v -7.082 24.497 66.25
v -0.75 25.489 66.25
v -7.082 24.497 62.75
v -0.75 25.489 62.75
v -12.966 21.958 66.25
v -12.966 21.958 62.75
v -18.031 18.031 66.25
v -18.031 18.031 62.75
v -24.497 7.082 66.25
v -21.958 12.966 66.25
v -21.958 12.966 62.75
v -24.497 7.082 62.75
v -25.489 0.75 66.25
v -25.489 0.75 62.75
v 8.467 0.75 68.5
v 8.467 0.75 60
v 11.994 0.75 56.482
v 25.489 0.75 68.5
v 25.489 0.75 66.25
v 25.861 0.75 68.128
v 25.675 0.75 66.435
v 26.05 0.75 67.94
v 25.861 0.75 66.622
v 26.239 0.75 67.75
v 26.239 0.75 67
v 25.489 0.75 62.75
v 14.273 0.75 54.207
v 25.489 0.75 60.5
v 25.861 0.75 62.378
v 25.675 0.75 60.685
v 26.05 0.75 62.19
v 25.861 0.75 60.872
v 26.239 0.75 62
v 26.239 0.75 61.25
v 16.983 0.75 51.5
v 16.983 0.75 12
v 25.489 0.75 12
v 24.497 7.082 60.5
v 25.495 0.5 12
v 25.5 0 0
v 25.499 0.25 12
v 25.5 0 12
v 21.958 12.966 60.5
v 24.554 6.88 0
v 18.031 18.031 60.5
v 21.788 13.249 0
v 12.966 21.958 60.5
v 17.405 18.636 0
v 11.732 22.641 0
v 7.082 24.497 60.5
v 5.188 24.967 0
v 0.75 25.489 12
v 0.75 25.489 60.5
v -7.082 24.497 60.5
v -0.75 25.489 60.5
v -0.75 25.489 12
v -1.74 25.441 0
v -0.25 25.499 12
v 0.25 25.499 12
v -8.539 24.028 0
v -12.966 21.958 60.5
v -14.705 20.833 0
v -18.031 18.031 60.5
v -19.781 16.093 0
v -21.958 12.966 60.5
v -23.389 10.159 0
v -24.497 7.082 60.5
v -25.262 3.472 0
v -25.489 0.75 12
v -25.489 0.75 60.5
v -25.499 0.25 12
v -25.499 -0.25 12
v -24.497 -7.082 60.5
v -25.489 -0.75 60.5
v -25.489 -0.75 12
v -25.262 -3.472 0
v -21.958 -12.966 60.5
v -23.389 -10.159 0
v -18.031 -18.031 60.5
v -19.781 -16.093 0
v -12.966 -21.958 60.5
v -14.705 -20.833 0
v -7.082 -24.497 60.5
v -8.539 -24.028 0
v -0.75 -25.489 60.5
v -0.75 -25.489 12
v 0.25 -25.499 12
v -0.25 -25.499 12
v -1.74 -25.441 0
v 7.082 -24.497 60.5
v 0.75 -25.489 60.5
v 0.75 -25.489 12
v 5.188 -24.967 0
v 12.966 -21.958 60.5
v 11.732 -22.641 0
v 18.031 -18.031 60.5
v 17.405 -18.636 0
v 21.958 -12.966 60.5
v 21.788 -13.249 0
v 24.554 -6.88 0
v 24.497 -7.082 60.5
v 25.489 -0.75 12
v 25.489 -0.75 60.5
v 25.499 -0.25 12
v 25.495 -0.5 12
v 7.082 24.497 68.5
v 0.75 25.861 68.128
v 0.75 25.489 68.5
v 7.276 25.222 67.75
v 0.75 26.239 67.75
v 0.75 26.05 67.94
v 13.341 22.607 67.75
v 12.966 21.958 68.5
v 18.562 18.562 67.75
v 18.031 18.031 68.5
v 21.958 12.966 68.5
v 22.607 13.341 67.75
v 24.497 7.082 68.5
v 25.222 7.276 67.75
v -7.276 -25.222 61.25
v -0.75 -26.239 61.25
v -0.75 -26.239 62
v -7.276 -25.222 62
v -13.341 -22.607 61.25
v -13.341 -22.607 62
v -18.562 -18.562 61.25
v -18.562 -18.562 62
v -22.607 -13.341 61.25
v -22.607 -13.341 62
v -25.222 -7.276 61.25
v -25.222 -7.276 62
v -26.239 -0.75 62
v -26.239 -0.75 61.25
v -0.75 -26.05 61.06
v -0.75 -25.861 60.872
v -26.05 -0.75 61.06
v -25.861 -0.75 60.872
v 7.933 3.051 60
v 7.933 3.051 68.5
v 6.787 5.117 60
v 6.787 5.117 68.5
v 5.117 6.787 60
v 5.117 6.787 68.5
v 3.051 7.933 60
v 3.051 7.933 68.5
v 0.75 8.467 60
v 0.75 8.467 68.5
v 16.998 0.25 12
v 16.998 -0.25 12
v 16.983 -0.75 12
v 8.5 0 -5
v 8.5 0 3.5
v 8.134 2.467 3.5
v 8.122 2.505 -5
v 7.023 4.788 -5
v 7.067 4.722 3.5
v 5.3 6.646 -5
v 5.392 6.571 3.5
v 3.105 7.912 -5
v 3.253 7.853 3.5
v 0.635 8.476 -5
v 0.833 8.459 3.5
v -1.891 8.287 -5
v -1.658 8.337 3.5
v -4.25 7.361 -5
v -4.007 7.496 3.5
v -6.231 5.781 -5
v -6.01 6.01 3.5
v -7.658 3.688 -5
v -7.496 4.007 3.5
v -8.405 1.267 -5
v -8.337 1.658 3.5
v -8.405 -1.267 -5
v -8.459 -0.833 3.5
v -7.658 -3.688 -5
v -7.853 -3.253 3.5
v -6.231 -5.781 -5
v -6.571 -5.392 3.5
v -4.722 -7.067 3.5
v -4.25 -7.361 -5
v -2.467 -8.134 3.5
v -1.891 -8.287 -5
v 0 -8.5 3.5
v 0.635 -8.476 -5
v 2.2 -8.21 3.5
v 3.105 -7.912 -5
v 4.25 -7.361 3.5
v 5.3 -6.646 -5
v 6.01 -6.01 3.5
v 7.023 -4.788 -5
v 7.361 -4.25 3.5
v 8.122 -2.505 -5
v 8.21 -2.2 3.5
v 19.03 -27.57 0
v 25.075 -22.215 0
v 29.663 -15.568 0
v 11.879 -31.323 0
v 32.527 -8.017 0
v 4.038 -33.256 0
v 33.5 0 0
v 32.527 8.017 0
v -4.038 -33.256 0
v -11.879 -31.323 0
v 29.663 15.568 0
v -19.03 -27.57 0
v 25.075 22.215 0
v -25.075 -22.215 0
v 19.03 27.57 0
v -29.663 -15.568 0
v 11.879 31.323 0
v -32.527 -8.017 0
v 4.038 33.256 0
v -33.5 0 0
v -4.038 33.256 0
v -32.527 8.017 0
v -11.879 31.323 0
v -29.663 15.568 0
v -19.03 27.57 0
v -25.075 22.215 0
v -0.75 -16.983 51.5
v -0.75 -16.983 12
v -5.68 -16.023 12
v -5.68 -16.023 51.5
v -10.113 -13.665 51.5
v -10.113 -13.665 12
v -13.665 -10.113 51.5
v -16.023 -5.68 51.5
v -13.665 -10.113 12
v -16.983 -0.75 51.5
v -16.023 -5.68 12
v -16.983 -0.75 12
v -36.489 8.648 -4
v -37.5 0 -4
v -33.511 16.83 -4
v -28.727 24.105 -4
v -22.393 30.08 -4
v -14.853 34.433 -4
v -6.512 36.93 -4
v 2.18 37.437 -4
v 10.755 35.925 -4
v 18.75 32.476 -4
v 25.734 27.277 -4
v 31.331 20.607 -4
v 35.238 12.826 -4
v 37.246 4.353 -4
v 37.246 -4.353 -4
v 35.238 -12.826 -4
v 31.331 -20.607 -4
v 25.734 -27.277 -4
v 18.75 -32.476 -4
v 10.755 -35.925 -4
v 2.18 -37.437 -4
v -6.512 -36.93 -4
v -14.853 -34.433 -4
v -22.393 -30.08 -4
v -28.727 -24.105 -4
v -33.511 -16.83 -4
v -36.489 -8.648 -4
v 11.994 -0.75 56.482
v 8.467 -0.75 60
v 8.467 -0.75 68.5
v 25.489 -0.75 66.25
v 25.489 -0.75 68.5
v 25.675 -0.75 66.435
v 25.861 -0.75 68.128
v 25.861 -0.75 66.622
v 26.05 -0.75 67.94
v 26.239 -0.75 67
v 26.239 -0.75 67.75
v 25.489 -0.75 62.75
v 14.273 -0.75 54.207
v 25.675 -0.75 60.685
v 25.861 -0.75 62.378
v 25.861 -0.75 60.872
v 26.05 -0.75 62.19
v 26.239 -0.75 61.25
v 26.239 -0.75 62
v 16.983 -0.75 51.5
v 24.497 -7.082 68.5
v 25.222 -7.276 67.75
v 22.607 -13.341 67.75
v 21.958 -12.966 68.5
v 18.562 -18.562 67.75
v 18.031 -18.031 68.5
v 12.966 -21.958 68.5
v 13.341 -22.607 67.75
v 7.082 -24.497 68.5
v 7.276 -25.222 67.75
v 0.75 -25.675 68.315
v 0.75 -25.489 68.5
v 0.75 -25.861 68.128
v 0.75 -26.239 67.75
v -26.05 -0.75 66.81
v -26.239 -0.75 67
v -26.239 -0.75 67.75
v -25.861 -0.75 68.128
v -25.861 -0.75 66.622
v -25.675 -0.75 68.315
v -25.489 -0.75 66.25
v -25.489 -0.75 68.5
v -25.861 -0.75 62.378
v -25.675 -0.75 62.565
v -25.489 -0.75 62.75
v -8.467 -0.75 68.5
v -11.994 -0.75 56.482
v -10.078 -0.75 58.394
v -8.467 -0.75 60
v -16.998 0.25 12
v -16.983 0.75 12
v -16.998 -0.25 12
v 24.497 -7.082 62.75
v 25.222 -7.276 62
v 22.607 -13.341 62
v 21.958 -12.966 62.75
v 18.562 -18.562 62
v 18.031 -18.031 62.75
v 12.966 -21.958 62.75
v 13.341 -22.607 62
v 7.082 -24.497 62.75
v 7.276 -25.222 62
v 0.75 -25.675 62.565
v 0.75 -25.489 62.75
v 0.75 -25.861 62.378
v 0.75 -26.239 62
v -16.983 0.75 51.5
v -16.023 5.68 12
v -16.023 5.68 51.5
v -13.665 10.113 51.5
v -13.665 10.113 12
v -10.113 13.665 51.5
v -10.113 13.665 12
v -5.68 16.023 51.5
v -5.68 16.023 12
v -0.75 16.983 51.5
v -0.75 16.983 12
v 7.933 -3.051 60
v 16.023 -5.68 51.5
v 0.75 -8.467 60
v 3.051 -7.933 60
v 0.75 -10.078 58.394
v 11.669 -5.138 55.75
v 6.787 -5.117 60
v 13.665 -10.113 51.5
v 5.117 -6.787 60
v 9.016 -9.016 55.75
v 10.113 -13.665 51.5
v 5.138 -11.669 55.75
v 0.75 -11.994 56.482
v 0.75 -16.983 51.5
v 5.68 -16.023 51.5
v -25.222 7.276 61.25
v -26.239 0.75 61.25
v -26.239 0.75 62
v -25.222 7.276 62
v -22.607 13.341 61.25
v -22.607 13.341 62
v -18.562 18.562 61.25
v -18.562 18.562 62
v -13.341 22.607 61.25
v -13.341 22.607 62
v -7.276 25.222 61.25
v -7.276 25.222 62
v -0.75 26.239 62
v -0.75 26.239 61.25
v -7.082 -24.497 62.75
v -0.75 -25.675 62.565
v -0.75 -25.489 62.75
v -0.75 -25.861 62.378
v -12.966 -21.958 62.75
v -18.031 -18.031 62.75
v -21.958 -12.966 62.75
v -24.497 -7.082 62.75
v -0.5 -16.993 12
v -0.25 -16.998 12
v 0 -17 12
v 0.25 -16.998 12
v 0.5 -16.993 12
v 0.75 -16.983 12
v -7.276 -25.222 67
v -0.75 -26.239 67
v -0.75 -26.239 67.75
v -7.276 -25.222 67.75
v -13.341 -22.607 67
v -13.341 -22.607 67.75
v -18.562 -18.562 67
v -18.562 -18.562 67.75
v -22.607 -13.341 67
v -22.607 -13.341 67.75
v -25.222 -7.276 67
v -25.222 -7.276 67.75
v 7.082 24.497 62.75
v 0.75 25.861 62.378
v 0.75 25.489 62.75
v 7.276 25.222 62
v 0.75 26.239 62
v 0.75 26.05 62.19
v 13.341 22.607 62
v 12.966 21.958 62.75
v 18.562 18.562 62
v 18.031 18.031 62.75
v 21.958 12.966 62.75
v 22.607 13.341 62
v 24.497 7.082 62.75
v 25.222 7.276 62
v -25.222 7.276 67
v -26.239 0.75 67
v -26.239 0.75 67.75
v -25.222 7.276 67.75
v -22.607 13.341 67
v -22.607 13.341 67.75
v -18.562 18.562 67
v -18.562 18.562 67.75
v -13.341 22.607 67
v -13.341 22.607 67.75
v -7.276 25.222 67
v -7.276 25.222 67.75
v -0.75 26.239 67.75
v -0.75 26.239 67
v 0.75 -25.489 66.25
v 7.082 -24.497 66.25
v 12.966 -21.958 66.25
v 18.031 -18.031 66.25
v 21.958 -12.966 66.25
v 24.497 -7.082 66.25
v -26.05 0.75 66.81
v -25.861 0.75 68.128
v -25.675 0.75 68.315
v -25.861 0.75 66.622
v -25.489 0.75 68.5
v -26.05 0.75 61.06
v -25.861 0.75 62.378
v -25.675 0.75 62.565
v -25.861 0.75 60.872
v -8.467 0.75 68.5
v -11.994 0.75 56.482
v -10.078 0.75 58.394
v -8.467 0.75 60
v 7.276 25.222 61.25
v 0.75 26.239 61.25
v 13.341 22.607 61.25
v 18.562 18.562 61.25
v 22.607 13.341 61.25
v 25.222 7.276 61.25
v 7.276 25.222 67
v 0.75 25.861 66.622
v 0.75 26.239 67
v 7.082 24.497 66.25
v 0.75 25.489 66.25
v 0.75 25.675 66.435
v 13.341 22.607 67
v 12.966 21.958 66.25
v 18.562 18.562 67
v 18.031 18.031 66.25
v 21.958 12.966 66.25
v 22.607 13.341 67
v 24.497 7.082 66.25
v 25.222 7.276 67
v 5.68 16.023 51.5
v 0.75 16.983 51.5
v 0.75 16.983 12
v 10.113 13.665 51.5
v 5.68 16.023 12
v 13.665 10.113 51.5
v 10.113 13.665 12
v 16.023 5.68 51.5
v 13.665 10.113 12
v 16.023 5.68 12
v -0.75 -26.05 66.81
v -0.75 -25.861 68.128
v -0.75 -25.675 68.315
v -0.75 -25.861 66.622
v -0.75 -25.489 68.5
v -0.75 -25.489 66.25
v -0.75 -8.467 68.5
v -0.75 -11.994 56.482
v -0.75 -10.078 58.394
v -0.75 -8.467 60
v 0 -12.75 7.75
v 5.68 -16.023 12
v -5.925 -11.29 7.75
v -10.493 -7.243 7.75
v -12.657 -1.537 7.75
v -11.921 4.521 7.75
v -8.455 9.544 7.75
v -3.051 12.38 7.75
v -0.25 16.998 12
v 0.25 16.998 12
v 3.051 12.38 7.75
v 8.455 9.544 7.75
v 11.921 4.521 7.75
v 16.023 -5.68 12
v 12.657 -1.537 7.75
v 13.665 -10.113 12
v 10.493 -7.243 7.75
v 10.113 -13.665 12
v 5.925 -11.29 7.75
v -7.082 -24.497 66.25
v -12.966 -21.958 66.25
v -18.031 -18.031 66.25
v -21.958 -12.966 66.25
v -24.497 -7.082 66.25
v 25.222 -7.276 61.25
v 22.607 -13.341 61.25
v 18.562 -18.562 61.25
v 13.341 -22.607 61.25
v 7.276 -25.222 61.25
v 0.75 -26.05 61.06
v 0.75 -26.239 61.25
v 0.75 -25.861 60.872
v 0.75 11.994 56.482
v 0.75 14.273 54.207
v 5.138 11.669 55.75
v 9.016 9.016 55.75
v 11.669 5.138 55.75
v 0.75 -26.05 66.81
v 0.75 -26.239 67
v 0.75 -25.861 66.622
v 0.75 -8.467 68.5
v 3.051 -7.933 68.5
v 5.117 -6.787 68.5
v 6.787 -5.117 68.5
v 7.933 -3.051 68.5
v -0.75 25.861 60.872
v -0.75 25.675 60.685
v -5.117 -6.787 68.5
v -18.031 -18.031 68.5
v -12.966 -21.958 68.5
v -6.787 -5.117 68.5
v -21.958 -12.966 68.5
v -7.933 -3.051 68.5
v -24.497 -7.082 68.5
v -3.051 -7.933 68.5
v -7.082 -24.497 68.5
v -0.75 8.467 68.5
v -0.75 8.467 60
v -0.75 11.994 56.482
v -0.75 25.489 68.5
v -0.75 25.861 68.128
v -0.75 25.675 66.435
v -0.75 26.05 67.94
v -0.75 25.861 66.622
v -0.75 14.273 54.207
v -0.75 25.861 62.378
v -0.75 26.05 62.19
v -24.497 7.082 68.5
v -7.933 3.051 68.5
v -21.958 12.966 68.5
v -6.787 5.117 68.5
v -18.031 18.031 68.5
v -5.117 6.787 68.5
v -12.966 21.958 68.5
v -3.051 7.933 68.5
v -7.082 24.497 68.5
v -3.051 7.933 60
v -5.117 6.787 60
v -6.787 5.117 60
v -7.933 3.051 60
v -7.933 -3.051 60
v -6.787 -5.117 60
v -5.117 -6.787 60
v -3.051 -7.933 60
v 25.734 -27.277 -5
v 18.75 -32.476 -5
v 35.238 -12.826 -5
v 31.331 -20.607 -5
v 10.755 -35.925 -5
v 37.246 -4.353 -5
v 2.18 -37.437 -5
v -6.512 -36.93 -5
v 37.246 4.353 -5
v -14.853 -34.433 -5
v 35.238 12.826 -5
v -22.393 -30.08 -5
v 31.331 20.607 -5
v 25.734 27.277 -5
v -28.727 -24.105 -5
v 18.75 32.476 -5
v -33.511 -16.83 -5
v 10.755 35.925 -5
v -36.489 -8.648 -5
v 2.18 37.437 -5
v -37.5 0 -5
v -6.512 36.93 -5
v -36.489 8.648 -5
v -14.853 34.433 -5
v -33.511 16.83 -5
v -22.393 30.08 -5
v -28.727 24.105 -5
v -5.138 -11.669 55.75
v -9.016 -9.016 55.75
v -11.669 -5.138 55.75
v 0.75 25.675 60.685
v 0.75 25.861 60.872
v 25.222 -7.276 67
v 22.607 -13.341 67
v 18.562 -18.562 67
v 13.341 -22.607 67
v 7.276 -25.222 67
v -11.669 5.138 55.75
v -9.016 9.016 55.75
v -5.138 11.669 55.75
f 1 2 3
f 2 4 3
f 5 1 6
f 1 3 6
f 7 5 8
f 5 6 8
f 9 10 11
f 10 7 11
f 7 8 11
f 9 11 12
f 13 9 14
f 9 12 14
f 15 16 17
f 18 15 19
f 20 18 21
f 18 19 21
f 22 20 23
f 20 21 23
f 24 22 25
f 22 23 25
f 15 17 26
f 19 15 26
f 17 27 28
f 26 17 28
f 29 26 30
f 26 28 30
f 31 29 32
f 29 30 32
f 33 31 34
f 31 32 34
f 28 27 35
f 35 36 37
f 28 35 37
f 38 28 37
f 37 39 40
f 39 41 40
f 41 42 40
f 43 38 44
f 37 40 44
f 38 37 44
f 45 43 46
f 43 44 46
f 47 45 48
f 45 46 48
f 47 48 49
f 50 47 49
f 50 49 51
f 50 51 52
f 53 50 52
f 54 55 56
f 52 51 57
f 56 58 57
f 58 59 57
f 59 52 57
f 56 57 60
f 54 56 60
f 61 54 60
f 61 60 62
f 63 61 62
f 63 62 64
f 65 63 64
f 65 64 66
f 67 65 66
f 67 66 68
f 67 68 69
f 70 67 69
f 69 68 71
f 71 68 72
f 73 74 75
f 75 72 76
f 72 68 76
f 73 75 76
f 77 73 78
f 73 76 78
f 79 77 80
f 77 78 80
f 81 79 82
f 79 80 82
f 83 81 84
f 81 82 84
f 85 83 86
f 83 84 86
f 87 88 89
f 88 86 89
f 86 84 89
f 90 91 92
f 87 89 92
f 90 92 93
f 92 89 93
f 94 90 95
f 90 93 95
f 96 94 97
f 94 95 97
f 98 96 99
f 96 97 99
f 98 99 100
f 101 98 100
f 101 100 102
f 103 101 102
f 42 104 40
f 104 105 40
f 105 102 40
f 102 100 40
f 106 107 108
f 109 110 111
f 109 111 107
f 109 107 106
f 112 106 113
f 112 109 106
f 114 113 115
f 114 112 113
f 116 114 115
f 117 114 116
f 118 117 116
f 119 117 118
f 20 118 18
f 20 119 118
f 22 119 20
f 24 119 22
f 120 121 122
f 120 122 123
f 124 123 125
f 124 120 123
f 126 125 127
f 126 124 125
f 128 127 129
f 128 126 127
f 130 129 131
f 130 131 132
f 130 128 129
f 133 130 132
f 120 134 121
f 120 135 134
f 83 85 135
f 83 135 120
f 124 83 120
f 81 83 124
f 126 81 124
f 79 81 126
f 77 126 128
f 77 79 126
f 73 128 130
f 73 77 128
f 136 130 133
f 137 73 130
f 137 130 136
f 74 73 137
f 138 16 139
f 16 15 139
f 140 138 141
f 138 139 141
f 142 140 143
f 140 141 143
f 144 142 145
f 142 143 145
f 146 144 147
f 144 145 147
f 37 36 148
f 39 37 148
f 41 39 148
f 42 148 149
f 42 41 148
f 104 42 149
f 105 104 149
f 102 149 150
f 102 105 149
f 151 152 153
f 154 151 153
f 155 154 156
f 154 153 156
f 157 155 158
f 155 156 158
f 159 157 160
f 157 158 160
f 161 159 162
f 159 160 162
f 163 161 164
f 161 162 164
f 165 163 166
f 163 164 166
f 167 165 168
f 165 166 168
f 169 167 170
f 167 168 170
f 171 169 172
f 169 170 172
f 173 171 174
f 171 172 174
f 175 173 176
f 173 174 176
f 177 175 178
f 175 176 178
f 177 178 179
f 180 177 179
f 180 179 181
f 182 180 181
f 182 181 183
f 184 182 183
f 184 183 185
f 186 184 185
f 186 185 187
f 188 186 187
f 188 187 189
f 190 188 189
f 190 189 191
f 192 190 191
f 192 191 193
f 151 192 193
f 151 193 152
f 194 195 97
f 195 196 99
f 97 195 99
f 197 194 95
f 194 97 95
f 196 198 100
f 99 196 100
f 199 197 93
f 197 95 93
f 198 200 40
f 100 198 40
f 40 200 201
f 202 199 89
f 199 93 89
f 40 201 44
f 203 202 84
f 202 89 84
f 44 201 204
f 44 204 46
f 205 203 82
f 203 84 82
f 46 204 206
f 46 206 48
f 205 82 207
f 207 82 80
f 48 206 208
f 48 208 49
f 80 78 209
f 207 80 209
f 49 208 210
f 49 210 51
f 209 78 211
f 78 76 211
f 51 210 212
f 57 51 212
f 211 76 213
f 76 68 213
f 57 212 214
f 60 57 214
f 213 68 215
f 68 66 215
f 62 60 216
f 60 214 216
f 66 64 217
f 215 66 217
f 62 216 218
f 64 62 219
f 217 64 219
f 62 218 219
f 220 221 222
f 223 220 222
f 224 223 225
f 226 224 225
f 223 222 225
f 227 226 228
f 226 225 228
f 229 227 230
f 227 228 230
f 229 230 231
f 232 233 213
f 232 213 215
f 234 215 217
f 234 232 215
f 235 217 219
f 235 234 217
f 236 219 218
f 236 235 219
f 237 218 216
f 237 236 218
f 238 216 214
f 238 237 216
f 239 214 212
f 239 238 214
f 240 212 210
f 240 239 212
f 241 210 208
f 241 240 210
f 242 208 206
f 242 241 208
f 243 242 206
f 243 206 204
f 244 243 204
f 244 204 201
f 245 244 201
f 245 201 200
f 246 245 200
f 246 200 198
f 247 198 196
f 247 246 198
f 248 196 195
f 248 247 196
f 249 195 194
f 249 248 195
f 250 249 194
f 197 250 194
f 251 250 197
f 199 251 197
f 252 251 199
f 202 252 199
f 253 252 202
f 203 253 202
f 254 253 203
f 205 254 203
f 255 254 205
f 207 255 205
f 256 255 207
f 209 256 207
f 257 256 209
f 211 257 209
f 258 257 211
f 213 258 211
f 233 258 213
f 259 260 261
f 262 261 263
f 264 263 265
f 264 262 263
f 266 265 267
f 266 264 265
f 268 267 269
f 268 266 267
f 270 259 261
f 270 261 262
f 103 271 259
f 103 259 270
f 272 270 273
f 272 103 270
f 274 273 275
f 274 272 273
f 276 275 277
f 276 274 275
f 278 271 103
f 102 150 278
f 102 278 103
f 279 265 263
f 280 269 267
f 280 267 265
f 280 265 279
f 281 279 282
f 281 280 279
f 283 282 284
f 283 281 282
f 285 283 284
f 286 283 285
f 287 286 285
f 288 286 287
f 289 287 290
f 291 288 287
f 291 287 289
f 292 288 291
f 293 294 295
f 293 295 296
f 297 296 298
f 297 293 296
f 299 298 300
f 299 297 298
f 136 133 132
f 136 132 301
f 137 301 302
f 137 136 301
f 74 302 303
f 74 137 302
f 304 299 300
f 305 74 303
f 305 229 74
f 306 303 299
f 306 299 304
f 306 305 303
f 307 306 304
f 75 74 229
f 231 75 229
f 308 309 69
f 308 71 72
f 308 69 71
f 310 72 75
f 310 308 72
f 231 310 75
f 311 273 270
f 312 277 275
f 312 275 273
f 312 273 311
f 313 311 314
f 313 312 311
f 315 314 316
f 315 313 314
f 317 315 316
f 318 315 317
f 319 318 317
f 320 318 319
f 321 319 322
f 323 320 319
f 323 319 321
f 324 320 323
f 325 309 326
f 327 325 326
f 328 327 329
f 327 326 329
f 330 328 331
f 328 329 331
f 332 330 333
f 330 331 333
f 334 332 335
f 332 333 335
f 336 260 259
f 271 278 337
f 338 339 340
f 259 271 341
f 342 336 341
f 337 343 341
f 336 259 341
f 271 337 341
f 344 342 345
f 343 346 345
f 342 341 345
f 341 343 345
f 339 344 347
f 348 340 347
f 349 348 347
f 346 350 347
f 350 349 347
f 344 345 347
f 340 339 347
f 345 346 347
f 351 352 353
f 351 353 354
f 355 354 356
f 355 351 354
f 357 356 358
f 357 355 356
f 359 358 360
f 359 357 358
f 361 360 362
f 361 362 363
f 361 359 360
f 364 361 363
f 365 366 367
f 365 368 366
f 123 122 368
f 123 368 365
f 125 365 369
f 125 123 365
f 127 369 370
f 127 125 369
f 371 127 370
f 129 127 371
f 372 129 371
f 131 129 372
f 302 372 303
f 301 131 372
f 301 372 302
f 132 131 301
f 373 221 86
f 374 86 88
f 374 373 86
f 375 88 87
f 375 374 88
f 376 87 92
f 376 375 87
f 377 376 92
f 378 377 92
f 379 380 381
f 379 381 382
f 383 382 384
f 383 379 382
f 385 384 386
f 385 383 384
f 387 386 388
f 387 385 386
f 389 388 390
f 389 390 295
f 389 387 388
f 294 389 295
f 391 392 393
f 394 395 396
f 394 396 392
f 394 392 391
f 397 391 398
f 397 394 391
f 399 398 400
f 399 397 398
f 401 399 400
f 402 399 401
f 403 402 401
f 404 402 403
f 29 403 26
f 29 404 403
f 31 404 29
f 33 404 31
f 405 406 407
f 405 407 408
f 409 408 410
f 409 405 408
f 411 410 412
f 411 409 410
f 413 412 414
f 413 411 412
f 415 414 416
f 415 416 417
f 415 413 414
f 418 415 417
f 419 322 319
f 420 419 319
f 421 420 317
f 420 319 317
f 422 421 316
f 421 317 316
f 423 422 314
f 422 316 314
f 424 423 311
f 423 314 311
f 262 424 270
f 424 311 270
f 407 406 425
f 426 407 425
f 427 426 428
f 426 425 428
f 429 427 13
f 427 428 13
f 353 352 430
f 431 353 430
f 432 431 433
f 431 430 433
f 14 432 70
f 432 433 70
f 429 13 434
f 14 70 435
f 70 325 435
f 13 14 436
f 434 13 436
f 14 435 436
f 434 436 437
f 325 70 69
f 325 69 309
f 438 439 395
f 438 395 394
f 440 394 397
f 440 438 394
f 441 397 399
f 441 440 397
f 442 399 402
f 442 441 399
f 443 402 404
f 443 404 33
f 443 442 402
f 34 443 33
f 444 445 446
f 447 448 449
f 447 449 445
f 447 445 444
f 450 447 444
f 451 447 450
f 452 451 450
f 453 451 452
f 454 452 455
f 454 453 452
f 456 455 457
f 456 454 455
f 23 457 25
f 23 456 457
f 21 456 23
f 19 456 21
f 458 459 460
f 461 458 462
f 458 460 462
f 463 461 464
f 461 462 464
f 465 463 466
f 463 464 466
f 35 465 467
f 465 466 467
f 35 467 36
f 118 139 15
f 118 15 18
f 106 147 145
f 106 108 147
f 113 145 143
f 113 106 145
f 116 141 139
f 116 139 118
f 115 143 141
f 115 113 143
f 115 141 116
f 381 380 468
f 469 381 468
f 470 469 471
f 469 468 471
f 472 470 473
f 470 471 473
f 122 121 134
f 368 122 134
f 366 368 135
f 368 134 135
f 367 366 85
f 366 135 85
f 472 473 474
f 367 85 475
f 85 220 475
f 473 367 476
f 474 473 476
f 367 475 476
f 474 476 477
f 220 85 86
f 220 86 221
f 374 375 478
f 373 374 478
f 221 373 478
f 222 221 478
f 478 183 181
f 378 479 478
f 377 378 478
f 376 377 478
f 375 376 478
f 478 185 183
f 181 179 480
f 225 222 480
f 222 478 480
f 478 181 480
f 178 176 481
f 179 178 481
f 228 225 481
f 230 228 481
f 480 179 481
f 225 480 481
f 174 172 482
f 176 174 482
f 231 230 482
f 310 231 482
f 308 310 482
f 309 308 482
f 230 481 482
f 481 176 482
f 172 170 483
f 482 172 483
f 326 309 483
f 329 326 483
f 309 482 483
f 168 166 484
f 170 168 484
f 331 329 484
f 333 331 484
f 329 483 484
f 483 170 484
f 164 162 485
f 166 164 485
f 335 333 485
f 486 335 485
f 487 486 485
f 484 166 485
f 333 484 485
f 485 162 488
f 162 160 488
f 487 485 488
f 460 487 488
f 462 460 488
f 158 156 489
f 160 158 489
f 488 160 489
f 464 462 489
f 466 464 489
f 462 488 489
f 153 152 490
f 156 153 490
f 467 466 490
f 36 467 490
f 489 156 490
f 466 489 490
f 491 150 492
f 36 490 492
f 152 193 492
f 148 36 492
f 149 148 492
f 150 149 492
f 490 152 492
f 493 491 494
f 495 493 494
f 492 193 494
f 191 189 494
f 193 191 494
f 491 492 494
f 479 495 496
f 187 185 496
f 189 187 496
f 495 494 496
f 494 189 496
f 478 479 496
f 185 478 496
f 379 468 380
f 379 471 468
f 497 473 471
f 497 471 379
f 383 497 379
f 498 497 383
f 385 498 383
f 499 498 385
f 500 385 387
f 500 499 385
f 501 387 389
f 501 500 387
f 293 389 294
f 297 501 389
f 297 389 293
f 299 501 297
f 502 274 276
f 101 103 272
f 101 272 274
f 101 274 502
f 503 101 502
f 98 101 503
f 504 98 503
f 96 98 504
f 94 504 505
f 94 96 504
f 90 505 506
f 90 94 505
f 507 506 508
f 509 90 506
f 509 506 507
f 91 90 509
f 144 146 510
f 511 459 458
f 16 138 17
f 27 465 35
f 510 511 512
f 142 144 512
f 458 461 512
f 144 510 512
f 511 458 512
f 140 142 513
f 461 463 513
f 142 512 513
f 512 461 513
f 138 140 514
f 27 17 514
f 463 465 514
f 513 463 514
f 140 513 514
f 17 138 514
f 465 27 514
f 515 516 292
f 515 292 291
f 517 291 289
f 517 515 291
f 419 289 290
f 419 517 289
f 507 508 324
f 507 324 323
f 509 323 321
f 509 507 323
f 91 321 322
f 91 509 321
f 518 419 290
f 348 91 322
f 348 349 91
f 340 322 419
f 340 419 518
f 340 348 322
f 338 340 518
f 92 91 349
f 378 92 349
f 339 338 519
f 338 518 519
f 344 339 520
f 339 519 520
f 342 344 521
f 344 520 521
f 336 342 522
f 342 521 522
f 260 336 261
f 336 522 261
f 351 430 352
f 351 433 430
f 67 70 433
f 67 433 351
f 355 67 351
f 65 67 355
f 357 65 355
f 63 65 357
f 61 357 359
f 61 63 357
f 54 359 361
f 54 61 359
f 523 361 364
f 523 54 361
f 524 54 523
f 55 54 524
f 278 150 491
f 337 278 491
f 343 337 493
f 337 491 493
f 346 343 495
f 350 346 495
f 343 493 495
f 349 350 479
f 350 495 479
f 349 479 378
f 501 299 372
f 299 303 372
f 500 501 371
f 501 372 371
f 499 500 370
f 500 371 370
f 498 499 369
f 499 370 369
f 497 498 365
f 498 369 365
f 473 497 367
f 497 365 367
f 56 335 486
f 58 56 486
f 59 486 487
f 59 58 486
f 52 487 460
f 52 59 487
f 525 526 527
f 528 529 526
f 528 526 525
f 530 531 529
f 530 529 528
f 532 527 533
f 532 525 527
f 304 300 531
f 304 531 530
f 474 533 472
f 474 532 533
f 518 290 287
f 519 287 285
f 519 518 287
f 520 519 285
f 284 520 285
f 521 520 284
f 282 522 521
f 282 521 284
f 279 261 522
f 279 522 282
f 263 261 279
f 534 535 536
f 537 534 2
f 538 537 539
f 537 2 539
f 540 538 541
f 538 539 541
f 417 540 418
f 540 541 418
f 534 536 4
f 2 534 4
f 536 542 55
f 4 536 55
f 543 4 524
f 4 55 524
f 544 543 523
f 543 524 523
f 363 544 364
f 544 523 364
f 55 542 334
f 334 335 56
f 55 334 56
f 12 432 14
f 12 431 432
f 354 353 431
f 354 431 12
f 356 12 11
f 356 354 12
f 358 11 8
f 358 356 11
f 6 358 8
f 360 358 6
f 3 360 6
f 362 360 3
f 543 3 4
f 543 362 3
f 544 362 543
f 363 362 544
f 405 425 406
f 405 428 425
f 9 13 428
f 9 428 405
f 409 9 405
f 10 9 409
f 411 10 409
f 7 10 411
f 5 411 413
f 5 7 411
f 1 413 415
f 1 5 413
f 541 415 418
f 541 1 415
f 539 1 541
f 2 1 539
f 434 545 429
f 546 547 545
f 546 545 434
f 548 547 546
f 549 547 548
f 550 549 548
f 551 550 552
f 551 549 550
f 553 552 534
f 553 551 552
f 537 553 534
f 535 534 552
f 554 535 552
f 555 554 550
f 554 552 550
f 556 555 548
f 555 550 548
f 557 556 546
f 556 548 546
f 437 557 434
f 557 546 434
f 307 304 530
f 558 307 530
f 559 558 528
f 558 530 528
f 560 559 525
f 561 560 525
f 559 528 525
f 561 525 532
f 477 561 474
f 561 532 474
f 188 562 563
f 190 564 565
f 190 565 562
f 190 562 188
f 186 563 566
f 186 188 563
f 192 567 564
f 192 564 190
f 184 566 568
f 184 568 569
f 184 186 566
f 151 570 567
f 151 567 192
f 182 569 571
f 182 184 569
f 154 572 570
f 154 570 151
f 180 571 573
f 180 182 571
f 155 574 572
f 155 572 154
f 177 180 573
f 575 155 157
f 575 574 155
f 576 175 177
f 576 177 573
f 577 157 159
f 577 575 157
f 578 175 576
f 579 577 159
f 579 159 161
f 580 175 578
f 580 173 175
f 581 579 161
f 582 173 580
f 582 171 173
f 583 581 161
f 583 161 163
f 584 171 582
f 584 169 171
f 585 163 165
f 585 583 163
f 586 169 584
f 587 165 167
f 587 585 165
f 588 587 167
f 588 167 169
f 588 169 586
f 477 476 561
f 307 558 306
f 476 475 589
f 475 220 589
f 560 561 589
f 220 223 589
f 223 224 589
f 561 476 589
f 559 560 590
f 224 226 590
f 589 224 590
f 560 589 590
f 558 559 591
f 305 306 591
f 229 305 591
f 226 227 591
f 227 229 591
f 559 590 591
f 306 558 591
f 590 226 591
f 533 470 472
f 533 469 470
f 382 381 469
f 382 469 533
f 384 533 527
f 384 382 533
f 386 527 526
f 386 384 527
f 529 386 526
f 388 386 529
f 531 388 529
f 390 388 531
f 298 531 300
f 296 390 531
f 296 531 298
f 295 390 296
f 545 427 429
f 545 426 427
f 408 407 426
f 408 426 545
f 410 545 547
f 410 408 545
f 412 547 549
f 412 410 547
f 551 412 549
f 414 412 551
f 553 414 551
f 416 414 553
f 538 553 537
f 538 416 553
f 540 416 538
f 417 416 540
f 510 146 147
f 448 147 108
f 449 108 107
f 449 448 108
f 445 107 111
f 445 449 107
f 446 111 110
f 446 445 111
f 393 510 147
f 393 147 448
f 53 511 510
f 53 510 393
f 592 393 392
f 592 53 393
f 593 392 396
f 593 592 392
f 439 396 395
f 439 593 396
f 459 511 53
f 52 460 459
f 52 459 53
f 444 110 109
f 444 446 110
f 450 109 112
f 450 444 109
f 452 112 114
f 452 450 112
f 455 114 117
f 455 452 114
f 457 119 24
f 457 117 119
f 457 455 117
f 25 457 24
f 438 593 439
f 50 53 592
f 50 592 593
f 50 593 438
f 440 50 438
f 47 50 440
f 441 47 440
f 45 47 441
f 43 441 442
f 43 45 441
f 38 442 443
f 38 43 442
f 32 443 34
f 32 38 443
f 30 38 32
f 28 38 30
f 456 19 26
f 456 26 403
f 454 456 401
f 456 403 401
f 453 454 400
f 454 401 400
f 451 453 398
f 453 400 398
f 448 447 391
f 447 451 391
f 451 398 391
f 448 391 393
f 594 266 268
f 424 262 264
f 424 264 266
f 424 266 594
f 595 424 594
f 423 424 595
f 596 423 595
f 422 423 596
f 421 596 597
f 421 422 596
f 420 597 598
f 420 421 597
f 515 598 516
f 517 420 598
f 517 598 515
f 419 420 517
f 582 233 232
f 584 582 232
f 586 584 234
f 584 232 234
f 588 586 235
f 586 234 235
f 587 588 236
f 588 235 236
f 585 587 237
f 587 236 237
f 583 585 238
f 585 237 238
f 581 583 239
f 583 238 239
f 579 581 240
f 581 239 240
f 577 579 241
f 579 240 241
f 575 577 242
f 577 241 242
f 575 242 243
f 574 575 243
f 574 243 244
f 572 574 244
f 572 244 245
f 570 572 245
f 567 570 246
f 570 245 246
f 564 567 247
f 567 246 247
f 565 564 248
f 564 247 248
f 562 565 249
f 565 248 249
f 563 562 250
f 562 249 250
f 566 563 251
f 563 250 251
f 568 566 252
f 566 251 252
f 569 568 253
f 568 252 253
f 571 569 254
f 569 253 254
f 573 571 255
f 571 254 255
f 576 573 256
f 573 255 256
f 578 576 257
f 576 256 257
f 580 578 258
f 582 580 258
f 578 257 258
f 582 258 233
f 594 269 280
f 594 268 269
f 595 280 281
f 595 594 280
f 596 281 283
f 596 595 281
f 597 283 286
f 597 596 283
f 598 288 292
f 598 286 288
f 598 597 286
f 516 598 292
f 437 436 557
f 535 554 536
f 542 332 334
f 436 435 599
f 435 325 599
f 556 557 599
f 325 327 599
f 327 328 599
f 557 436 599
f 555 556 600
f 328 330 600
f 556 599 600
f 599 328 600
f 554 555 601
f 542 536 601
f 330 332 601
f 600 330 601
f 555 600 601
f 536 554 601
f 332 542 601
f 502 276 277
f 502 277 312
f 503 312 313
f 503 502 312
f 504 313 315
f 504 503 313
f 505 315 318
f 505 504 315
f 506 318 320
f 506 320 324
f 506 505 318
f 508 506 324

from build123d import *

# Parameters (mm, degrees)
AXLE_BASE_SKETCH_R        = 25.5
AXLE_DEPTH                = 68.5
GUARD_BASE_R              = 37.5
GUARD_DEPTH               = 5
INNER_AXLE_HOLE_BASE_R    = 8.5
INNER_AXLE_HOLE_DEPTH     = 74.5
BEND_START                = -56.5
BEND_ROOM_BASE_W          = 1.5
BEND_ROOM_BASE_H          = 75
BEND_ROOM_1_DEPTH         = 56.500001
BEND_ROOM_2_COUNT         = 2
BEND_ROOM_2_ANGLE         = 90
EASY_REMOVAL_CHAMFER_SIZE = 4


with BuildPart() as part:
    # Axle base sketch → Axle (new body)
    with BuildSketch(Plane.XY):
        Circle(AXLE_BASE_SKETCH_R)
    extrude(amount=AXLE_DEPTH)

    # Guard base → Guard (add)
    with BuildSketch(Plane(origin=(0, 0, 0), x_dir=(-1, 0, 0), z_dir=(0, 0, -1))):
        Circle(GUARD_BASE_R)
    extrude(amount=GUARD_DEPTH)

    # Inner axle hole base → Inner axle hole (cut, through all)
    with BuildSketch(Plane.XY.offset(68.5)):
        Circle(INNER_AXLE_HOLE_BASE_R)
    extrude(amount=-INNER_AXLE_HOLE_DEPTH, mode=Mode.SUBTRACT)

    # Mate ring base → Mate rings (revolve)
    with BuildSketch(Plane(origin=(0, 0, 0), x_dir=(1, 0, 0), z_dir=(0, 1, 0))):
        Polygon((25.5, -68.5), (26.25, -67.75), (26.25, -67), (25.5, -66.25), align=None)
        Polygon((25.5, -62.75), (26.25, -62), (26.25, -61.25), (25.5, -60.5), align=None)
    revolve(axis=Axis((0, 0, 0), (0, 0, -1)))

    # Inner mass remove base → Inner mass remove (revolve, cut)
    with BuildSketch(Plane(origin=(0, 0, 0), x_dir=(0, 0, -1), z_dir=(1, 0, 0))):
        Polygon((-68.5, 0), (-51.5, -17), (-12, -17), (5, 0), align=None)
    revolve(axis=Axis((0, 0, 0), (0, 0, -1)), mode=Mode.SUBTRACT)

    # Bend room base → Bend room 1 (cut)
    with BuildSketch(Plane.XY.offset(68.5).offset(BEND_START)):
        Rectangle(BEND_ROOM_BASE_W, BEND_ROOM_BASE_H)
    bend_room_1 = extrude(amount=BEND_ROOM_1_DEPTH, mode=Mode.SUBTRACT)

    # Bend room 2: Bend room 1 ×2 about axis
    bend_room_2_axis = Axis((0, 0, 0), (0, 0, -1))
    for i in range(1, BEND_ROOM_2_COUNT):
        add(bend_room_1.rotate(bend_room_2_axis, i * BEND_ROOM_2_ANGLE / (BEND_ROOM_2_COUNT - 1)), mode=Mode.SUBTRACT)

    # Easy removal chamfer
    easy_removal_chamfer_edges = [part.edges().sort_by_distance(p)[0] for p in [
        (37.5, 0, 0),
    ]]
    chamfer(easy_removal_chamfer_edges, length=EASY_REMOVAL_CHAMFER_SIZE)


solid = part.part
